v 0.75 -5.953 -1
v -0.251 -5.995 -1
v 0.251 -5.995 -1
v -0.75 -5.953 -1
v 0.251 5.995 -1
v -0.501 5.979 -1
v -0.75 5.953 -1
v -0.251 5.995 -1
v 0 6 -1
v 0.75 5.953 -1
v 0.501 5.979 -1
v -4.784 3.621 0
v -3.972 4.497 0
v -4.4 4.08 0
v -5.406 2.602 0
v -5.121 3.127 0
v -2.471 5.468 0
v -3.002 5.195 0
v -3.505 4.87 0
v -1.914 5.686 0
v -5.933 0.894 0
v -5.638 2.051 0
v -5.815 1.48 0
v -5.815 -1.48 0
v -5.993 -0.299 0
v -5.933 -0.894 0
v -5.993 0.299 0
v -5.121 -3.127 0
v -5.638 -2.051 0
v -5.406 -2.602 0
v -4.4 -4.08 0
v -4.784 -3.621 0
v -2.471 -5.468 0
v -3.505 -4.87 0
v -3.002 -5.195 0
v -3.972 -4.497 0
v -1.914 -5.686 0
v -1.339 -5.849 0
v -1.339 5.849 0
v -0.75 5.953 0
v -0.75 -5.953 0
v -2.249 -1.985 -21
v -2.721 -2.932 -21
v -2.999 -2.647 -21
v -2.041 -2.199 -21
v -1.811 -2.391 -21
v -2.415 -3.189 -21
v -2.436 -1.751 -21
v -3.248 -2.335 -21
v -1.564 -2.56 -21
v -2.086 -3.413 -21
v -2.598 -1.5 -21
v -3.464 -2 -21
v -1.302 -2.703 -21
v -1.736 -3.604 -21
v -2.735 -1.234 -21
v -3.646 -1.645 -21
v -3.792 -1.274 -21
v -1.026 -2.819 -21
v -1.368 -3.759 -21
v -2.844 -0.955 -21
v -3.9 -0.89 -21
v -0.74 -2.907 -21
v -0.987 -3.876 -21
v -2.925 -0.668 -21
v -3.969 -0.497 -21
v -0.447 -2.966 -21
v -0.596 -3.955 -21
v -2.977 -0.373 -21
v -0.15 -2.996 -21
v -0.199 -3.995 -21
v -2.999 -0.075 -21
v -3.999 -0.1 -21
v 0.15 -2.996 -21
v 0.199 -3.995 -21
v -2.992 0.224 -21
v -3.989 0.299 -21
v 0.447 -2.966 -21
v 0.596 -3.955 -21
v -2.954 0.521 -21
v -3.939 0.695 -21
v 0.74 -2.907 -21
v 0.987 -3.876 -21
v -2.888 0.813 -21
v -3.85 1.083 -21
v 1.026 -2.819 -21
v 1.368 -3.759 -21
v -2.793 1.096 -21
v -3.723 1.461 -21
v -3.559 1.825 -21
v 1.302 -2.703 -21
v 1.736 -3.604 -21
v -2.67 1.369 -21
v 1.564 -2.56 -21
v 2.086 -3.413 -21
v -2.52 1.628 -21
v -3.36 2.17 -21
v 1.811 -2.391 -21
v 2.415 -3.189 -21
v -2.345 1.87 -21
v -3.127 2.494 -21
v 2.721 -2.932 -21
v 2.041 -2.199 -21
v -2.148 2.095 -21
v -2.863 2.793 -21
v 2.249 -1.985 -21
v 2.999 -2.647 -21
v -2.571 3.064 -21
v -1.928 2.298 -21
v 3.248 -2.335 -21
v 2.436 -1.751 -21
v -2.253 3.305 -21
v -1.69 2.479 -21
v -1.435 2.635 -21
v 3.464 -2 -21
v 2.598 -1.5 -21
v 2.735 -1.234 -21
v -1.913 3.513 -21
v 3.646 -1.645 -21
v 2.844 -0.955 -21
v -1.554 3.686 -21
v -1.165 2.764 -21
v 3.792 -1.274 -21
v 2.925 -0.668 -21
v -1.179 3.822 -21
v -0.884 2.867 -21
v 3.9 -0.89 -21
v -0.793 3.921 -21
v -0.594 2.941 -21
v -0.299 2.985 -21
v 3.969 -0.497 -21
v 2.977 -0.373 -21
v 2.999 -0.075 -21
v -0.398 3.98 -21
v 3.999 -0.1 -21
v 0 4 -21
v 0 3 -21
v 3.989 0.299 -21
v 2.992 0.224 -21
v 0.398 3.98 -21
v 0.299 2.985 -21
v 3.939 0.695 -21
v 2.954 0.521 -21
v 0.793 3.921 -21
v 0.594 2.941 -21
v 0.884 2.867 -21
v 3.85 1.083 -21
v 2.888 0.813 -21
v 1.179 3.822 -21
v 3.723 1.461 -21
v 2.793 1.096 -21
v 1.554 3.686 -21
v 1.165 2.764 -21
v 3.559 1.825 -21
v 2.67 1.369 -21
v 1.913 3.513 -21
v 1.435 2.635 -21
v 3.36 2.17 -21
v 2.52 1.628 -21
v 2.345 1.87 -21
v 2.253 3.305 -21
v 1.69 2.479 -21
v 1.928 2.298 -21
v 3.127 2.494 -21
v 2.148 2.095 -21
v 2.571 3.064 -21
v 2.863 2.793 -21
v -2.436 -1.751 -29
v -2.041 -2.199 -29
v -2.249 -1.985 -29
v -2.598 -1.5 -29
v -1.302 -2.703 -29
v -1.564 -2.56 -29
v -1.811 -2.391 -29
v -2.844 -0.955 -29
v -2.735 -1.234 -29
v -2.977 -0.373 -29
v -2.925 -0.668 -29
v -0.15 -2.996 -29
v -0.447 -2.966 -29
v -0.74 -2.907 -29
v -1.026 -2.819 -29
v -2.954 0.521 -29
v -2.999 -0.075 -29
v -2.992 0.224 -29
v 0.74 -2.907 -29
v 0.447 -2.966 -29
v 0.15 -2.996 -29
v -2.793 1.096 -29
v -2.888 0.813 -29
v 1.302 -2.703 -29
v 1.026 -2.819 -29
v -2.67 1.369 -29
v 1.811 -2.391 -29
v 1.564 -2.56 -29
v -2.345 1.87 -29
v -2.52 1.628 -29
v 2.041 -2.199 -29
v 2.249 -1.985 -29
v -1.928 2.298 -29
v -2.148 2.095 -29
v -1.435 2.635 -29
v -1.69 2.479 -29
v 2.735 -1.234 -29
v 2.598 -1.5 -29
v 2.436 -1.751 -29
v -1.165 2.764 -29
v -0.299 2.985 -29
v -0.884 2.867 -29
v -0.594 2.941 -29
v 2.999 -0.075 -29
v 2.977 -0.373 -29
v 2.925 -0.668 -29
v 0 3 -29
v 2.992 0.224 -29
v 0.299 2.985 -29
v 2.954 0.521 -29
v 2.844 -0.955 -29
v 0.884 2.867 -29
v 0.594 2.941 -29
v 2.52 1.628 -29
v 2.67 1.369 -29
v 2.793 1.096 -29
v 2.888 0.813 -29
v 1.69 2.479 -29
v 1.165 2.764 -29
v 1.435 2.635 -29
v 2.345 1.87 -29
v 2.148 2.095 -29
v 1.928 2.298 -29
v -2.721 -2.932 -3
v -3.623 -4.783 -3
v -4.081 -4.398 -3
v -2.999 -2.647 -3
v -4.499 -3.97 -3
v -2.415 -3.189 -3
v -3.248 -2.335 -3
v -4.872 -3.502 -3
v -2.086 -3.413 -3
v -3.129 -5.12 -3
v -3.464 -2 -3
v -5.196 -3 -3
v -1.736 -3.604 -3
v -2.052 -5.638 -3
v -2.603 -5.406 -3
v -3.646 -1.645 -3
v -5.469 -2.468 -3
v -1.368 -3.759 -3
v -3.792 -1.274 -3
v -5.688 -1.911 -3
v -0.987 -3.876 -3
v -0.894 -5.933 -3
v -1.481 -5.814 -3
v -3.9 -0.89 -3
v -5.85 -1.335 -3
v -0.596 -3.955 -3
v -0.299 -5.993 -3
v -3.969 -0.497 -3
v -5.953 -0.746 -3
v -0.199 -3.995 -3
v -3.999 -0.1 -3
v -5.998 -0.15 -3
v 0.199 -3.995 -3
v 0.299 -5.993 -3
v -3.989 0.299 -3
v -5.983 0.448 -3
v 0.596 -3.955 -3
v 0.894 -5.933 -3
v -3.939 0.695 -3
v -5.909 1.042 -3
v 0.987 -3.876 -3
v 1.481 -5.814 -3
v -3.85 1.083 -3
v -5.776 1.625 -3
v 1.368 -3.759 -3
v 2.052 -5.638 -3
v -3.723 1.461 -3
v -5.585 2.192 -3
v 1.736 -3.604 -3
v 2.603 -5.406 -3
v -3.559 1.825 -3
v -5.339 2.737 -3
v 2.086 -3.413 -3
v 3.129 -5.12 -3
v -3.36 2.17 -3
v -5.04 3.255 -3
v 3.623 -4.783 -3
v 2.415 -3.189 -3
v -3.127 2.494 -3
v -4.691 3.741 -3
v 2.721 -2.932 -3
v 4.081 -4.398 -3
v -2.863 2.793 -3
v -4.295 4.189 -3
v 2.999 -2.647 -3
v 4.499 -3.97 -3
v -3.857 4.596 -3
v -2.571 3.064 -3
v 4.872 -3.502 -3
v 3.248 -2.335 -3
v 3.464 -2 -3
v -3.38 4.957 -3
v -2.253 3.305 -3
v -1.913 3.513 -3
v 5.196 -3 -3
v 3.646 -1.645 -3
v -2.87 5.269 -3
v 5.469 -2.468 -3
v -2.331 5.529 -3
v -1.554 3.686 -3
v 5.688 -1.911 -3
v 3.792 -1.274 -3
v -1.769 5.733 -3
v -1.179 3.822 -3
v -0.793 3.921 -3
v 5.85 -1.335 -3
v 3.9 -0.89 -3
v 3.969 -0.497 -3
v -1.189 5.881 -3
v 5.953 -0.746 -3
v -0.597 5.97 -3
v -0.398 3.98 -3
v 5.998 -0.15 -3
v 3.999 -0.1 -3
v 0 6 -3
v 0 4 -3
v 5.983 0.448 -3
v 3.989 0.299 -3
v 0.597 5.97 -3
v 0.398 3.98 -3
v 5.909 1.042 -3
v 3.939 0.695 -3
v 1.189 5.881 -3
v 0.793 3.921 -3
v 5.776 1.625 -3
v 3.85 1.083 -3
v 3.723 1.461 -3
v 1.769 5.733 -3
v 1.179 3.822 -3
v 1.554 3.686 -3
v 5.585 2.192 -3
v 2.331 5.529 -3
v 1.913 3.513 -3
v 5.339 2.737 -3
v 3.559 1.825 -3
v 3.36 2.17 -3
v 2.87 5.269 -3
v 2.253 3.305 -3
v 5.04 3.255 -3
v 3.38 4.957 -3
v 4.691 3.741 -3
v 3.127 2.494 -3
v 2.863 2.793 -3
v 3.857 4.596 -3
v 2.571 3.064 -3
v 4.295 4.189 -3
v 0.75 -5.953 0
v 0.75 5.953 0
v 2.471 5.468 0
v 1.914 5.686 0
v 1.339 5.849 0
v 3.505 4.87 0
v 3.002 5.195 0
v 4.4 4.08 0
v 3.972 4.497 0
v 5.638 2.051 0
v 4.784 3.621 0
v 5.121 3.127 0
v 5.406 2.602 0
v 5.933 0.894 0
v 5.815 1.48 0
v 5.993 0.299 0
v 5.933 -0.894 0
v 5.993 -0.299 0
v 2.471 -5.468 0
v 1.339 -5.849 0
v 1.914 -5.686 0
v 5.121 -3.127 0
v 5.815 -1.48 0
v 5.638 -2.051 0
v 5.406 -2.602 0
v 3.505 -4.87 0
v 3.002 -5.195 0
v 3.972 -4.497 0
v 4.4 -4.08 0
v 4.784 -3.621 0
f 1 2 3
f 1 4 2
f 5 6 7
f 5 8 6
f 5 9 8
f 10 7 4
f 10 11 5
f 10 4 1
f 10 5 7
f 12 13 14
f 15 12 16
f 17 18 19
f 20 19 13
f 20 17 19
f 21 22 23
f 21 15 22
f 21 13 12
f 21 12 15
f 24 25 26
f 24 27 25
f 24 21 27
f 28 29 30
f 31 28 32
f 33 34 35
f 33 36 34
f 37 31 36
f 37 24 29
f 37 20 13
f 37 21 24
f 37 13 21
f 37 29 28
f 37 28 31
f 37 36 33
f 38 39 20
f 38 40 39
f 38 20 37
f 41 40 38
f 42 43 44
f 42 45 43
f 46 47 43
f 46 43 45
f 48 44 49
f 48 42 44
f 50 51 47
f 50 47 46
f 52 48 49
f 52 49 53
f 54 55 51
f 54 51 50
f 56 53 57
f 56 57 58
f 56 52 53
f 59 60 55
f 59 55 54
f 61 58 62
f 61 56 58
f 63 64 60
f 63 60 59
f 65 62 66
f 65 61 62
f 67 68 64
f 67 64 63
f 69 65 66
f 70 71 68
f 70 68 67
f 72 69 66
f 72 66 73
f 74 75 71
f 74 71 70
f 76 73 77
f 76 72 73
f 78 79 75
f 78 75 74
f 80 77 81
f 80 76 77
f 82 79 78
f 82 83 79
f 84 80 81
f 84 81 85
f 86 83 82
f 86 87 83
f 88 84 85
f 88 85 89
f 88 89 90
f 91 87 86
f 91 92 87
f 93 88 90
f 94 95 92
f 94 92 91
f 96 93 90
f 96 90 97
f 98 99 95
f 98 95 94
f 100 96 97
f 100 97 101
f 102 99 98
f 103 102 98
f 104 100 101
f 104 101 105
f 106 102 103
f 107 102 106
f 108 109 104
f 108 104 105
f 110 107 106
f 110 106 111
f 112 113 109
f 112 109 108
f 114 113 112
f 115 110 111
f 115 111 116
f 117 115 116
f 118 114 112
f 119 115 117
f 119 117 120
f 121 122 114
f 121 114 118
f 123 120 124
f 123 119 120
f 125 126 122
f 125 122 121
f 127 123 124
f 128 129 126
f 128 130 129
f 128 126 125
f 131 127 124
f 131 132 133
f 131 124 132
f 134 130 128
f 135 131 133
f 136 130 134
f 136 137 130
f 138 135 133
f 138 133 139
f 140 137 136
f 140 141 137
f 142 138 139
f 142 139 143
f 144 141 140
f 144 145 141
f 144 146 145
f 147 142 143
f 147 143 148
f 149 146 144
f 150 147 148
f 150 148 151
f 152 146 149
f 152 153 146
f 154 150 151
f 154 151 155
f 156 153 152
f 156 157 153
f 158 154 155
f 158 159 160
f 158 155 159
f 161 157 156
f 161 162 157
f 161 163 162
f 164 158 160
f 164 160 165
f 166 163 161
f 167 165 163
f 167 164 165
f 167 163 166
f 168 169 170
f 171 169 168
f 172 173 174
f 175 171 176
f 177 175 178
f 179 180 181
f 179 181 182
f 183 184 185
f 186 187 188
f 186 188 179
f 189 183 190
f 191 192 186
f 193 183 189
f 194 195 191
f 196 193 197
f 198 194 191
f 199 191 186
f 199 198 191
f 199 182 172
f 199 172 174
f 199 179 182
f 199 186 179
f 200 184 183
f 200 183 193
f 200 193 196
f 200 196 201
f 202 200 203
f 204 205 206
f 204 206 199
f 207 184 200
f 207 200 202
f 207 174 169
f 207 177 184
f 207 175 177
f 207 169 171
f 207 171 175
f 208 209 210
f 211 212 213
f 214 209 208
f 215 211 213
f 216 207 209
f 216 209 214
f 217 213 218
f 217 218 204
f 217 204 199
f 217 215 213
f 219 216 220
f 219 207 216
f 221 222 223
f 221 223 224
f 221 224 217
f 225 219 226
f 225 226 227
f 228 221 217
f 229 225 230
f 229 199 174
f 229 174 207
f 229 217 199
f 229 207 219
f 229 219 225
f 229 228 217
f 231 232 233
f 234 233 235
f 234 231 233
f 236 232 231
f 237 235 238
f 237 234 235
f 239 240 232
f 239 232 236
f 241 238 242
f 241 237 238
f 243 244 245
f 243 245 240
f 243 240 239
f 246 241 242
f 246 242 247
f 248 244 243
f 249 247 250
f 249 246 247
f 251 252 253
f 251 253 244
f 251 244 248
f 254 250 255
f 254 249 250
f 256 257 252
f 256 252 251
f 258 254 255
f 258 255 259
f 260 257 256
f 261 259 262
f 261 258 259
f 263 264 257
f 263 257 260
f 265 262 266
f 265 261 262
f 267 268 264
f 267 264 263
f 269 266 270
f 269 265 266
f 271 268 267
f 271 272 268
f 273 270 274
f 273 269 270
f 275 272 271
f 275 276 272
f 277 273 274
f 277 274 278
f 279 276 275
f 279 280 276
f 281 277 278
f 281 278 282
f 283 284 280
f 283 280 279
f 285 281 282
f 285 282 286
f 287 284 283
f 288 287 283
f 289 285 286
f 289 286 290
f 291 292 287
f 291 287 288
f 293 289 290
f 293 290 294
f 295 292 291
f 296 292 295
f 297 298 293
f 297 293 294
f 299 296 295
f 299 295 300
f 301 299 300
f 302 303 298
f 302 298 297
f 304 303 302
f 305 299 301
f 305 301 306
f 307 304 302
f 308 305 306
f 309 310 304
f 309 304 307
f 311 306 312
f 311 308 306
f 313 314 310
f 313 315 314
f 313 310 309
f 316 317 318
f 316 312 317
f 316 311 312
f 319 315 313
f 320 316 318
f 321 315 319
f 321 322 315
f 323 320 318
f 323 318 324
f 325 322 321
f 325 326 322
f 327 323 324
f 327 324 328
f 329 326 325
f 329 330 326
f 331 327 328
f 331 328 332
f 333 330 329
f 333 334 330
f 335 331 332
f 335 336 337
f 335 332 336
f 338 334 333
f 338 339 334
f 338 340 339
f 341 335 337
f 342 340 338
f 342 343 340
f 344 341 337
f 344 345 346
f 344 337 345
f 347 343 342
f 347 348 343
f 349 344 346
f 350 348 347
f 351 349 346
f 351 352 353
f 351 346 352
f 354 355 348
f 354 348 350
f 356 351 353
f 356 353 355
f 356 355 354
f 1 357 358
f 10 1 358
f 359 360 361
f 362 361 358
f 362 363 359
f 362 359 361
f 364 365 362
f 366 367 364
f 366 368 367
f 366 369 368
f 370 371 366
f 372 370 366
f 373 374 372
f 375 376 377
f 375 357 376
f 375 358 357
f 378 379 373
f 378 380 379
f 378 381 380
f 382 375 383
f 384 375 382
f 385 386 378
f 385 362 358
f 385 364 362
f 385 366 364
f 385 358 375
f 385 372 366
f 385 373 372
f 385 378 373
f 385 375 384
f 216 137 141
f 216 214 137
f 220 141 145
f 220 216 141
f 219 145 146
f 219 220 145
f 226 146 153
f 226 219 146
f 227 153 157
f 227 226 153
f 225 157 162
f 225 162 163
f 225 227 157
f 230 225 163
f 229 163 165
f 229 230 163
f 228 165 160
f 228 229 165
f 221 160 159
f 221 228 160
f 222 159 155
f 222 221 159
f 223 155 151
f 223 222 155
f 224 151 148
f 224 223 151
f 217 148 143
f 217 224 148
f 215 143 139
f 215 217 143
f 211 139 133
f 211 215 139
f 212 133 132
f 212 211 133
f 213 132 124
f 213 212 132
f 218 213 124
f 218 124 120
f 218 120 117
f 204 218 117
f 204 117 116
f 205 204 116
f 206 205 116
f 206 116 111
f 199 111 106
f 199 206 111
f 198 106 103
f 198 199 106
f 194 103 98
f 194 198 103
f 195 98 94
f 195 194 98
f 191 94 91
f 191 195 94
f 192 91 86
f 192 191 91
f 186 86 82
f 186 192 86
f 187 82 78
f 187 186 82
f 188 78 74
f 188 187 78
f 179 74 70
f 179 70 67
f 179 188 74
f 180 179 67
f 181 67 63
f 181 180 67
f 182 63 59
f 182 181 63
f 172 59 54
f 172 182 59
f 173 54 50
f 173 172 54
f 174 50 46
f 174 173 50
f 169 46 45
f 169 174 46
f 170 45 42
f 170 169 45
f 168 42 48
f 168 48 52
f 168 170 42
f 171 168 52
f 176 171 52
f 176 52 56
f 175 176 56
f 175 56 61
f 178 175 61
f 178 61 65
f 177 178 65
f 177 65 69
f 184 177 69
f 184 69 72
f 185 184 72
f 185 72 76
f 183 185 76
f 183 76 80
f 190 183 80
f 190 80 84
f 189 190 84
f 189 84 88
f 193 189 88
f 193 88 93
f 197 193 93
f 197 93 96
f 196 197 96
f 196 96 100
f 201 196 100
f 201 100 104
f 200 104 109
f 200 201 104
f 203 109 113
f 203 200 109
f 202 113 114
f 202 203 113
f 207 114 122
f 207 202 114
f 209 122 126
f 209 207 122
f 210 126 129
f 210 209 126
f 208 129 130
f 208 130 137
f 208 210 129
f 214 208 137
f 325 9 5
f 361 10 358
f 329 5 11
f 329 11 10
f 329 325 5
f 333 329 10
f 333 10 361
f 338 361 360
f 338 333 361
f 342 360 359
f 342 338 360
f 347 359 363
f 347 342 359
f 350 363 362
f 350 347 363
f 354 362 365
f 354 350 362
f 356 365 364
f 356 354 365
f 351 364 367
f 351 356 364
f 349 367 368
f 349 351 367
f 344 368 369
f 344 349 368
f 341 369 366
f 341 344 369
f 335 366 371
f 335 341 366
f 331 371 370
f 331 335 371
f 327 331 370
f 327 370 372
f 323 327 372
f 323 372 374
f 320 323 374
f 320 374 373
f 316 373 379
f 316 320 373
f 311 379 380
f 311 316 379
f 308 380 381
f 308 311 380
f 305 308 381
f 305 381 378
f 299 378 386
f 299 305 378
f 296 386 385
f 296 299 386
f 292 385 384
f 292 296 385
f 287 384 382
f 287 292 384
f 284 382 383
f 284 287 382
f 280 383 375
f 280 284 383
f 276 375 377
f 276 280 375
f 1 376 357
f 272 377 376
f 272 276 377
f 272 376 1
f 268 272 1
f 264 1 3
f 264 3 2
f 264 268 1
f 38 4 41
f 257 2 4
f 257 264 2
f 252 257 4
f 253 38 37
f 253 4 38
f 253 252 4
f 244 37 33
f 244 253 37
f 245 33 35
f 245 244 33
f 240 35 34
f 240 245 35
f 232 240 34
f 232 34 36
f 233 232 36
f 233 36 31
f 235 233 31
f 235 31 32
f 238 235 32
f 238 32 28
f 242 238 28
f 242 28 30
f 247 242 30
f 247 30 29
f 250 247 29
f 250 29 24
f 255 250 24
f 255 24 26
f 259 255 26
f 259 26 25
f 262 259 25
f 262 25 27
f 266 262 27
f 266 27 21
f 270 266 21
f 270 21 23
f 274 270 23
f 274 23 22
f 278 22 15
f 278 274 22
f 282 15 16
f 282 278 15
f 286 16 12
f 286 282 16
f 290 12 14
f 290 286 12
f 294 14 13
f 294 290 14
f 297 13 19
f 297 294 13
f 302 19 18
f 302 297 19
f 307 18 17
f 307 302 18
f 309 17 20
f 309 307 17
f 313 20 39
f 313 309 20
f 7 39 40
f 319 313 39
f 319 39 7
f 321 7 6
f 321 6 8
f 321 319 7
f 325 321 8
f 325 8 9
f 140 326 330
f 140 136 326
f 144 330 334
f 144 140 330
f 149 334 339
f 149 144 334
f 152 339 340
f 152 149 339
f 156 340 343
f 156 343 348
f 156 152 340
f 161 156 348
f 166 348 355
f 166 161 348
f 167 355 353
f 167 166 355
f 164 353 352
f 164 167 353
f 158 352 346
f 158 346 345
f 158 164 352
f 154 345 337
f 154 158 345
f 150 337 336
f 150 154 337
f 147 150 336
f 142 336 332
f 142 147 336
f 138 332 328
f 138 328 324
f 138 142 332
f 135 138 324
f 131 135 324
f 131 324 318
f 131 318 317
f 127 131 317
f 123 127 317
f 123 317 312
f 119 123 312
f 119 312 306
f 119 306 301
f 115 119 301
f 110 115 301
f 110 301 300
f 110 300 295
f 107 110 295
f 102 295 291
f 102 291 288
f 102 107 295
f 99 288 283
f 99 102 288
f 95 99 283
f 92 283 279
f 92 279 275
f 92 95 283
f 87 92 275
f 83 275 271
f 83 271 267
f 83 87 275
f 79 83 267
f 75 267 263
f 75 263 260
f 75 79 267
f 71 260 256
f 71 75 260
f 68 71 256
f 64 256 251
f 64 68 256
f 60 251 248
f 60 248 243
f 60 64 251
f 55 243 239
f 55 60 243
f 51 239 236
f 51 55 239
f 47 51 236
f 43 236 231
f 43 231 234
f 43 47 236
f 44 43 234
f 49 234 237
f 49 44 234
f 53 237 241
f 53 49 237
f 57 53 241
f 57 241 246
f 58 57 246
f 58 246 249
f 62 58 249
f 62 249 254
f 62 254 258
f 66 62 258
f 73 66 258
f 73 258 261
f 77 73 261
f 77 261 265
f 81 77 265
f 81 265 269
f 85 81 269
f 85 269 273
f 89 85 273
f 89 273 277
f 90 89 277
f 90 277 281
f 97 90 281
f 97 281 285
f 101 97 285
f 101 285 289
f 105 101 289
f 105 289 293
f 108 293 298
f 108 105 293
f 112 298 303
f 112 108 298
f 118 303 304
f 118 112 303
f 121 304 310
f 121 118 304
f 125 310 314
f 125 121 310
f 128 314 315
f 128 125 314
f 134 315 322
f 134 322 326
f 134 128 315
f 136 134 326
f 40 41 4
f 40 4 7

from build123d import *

# Parameters (mm, degrees)
SKETCH_3_W          = 1.5
SKETCH_3_H          = 12
CUT_EXTRUDE_1_DEPTH = 1


with BuildPart() as part:
    # 草图2 → 旋转1 (revolve)
    with BuildSketch(Plane(origin=(0, 0, 0), x_dir=(0, 0, -1), z_dir=(1, 0, 0))):
        Polygon((0, 0), (0, 6), (3, 6), (3, 4), (21, 4), (21, 3), (29, 3), (29, 0), align=None)
    revolve(axis=Axis((0, 0, 0), (0, 0, -1)))

    # 草图3 → 切除-拉伸1 (cut)
    with BuildSketch(Plane.XY):
        Rectangle(SKETCH_3_W, SKETCH_3_H)
    extrude(amount=-CUT_EXTRUDE_1_DEPTH, mode=Mode.SUBTRACT)


solid = part.part
